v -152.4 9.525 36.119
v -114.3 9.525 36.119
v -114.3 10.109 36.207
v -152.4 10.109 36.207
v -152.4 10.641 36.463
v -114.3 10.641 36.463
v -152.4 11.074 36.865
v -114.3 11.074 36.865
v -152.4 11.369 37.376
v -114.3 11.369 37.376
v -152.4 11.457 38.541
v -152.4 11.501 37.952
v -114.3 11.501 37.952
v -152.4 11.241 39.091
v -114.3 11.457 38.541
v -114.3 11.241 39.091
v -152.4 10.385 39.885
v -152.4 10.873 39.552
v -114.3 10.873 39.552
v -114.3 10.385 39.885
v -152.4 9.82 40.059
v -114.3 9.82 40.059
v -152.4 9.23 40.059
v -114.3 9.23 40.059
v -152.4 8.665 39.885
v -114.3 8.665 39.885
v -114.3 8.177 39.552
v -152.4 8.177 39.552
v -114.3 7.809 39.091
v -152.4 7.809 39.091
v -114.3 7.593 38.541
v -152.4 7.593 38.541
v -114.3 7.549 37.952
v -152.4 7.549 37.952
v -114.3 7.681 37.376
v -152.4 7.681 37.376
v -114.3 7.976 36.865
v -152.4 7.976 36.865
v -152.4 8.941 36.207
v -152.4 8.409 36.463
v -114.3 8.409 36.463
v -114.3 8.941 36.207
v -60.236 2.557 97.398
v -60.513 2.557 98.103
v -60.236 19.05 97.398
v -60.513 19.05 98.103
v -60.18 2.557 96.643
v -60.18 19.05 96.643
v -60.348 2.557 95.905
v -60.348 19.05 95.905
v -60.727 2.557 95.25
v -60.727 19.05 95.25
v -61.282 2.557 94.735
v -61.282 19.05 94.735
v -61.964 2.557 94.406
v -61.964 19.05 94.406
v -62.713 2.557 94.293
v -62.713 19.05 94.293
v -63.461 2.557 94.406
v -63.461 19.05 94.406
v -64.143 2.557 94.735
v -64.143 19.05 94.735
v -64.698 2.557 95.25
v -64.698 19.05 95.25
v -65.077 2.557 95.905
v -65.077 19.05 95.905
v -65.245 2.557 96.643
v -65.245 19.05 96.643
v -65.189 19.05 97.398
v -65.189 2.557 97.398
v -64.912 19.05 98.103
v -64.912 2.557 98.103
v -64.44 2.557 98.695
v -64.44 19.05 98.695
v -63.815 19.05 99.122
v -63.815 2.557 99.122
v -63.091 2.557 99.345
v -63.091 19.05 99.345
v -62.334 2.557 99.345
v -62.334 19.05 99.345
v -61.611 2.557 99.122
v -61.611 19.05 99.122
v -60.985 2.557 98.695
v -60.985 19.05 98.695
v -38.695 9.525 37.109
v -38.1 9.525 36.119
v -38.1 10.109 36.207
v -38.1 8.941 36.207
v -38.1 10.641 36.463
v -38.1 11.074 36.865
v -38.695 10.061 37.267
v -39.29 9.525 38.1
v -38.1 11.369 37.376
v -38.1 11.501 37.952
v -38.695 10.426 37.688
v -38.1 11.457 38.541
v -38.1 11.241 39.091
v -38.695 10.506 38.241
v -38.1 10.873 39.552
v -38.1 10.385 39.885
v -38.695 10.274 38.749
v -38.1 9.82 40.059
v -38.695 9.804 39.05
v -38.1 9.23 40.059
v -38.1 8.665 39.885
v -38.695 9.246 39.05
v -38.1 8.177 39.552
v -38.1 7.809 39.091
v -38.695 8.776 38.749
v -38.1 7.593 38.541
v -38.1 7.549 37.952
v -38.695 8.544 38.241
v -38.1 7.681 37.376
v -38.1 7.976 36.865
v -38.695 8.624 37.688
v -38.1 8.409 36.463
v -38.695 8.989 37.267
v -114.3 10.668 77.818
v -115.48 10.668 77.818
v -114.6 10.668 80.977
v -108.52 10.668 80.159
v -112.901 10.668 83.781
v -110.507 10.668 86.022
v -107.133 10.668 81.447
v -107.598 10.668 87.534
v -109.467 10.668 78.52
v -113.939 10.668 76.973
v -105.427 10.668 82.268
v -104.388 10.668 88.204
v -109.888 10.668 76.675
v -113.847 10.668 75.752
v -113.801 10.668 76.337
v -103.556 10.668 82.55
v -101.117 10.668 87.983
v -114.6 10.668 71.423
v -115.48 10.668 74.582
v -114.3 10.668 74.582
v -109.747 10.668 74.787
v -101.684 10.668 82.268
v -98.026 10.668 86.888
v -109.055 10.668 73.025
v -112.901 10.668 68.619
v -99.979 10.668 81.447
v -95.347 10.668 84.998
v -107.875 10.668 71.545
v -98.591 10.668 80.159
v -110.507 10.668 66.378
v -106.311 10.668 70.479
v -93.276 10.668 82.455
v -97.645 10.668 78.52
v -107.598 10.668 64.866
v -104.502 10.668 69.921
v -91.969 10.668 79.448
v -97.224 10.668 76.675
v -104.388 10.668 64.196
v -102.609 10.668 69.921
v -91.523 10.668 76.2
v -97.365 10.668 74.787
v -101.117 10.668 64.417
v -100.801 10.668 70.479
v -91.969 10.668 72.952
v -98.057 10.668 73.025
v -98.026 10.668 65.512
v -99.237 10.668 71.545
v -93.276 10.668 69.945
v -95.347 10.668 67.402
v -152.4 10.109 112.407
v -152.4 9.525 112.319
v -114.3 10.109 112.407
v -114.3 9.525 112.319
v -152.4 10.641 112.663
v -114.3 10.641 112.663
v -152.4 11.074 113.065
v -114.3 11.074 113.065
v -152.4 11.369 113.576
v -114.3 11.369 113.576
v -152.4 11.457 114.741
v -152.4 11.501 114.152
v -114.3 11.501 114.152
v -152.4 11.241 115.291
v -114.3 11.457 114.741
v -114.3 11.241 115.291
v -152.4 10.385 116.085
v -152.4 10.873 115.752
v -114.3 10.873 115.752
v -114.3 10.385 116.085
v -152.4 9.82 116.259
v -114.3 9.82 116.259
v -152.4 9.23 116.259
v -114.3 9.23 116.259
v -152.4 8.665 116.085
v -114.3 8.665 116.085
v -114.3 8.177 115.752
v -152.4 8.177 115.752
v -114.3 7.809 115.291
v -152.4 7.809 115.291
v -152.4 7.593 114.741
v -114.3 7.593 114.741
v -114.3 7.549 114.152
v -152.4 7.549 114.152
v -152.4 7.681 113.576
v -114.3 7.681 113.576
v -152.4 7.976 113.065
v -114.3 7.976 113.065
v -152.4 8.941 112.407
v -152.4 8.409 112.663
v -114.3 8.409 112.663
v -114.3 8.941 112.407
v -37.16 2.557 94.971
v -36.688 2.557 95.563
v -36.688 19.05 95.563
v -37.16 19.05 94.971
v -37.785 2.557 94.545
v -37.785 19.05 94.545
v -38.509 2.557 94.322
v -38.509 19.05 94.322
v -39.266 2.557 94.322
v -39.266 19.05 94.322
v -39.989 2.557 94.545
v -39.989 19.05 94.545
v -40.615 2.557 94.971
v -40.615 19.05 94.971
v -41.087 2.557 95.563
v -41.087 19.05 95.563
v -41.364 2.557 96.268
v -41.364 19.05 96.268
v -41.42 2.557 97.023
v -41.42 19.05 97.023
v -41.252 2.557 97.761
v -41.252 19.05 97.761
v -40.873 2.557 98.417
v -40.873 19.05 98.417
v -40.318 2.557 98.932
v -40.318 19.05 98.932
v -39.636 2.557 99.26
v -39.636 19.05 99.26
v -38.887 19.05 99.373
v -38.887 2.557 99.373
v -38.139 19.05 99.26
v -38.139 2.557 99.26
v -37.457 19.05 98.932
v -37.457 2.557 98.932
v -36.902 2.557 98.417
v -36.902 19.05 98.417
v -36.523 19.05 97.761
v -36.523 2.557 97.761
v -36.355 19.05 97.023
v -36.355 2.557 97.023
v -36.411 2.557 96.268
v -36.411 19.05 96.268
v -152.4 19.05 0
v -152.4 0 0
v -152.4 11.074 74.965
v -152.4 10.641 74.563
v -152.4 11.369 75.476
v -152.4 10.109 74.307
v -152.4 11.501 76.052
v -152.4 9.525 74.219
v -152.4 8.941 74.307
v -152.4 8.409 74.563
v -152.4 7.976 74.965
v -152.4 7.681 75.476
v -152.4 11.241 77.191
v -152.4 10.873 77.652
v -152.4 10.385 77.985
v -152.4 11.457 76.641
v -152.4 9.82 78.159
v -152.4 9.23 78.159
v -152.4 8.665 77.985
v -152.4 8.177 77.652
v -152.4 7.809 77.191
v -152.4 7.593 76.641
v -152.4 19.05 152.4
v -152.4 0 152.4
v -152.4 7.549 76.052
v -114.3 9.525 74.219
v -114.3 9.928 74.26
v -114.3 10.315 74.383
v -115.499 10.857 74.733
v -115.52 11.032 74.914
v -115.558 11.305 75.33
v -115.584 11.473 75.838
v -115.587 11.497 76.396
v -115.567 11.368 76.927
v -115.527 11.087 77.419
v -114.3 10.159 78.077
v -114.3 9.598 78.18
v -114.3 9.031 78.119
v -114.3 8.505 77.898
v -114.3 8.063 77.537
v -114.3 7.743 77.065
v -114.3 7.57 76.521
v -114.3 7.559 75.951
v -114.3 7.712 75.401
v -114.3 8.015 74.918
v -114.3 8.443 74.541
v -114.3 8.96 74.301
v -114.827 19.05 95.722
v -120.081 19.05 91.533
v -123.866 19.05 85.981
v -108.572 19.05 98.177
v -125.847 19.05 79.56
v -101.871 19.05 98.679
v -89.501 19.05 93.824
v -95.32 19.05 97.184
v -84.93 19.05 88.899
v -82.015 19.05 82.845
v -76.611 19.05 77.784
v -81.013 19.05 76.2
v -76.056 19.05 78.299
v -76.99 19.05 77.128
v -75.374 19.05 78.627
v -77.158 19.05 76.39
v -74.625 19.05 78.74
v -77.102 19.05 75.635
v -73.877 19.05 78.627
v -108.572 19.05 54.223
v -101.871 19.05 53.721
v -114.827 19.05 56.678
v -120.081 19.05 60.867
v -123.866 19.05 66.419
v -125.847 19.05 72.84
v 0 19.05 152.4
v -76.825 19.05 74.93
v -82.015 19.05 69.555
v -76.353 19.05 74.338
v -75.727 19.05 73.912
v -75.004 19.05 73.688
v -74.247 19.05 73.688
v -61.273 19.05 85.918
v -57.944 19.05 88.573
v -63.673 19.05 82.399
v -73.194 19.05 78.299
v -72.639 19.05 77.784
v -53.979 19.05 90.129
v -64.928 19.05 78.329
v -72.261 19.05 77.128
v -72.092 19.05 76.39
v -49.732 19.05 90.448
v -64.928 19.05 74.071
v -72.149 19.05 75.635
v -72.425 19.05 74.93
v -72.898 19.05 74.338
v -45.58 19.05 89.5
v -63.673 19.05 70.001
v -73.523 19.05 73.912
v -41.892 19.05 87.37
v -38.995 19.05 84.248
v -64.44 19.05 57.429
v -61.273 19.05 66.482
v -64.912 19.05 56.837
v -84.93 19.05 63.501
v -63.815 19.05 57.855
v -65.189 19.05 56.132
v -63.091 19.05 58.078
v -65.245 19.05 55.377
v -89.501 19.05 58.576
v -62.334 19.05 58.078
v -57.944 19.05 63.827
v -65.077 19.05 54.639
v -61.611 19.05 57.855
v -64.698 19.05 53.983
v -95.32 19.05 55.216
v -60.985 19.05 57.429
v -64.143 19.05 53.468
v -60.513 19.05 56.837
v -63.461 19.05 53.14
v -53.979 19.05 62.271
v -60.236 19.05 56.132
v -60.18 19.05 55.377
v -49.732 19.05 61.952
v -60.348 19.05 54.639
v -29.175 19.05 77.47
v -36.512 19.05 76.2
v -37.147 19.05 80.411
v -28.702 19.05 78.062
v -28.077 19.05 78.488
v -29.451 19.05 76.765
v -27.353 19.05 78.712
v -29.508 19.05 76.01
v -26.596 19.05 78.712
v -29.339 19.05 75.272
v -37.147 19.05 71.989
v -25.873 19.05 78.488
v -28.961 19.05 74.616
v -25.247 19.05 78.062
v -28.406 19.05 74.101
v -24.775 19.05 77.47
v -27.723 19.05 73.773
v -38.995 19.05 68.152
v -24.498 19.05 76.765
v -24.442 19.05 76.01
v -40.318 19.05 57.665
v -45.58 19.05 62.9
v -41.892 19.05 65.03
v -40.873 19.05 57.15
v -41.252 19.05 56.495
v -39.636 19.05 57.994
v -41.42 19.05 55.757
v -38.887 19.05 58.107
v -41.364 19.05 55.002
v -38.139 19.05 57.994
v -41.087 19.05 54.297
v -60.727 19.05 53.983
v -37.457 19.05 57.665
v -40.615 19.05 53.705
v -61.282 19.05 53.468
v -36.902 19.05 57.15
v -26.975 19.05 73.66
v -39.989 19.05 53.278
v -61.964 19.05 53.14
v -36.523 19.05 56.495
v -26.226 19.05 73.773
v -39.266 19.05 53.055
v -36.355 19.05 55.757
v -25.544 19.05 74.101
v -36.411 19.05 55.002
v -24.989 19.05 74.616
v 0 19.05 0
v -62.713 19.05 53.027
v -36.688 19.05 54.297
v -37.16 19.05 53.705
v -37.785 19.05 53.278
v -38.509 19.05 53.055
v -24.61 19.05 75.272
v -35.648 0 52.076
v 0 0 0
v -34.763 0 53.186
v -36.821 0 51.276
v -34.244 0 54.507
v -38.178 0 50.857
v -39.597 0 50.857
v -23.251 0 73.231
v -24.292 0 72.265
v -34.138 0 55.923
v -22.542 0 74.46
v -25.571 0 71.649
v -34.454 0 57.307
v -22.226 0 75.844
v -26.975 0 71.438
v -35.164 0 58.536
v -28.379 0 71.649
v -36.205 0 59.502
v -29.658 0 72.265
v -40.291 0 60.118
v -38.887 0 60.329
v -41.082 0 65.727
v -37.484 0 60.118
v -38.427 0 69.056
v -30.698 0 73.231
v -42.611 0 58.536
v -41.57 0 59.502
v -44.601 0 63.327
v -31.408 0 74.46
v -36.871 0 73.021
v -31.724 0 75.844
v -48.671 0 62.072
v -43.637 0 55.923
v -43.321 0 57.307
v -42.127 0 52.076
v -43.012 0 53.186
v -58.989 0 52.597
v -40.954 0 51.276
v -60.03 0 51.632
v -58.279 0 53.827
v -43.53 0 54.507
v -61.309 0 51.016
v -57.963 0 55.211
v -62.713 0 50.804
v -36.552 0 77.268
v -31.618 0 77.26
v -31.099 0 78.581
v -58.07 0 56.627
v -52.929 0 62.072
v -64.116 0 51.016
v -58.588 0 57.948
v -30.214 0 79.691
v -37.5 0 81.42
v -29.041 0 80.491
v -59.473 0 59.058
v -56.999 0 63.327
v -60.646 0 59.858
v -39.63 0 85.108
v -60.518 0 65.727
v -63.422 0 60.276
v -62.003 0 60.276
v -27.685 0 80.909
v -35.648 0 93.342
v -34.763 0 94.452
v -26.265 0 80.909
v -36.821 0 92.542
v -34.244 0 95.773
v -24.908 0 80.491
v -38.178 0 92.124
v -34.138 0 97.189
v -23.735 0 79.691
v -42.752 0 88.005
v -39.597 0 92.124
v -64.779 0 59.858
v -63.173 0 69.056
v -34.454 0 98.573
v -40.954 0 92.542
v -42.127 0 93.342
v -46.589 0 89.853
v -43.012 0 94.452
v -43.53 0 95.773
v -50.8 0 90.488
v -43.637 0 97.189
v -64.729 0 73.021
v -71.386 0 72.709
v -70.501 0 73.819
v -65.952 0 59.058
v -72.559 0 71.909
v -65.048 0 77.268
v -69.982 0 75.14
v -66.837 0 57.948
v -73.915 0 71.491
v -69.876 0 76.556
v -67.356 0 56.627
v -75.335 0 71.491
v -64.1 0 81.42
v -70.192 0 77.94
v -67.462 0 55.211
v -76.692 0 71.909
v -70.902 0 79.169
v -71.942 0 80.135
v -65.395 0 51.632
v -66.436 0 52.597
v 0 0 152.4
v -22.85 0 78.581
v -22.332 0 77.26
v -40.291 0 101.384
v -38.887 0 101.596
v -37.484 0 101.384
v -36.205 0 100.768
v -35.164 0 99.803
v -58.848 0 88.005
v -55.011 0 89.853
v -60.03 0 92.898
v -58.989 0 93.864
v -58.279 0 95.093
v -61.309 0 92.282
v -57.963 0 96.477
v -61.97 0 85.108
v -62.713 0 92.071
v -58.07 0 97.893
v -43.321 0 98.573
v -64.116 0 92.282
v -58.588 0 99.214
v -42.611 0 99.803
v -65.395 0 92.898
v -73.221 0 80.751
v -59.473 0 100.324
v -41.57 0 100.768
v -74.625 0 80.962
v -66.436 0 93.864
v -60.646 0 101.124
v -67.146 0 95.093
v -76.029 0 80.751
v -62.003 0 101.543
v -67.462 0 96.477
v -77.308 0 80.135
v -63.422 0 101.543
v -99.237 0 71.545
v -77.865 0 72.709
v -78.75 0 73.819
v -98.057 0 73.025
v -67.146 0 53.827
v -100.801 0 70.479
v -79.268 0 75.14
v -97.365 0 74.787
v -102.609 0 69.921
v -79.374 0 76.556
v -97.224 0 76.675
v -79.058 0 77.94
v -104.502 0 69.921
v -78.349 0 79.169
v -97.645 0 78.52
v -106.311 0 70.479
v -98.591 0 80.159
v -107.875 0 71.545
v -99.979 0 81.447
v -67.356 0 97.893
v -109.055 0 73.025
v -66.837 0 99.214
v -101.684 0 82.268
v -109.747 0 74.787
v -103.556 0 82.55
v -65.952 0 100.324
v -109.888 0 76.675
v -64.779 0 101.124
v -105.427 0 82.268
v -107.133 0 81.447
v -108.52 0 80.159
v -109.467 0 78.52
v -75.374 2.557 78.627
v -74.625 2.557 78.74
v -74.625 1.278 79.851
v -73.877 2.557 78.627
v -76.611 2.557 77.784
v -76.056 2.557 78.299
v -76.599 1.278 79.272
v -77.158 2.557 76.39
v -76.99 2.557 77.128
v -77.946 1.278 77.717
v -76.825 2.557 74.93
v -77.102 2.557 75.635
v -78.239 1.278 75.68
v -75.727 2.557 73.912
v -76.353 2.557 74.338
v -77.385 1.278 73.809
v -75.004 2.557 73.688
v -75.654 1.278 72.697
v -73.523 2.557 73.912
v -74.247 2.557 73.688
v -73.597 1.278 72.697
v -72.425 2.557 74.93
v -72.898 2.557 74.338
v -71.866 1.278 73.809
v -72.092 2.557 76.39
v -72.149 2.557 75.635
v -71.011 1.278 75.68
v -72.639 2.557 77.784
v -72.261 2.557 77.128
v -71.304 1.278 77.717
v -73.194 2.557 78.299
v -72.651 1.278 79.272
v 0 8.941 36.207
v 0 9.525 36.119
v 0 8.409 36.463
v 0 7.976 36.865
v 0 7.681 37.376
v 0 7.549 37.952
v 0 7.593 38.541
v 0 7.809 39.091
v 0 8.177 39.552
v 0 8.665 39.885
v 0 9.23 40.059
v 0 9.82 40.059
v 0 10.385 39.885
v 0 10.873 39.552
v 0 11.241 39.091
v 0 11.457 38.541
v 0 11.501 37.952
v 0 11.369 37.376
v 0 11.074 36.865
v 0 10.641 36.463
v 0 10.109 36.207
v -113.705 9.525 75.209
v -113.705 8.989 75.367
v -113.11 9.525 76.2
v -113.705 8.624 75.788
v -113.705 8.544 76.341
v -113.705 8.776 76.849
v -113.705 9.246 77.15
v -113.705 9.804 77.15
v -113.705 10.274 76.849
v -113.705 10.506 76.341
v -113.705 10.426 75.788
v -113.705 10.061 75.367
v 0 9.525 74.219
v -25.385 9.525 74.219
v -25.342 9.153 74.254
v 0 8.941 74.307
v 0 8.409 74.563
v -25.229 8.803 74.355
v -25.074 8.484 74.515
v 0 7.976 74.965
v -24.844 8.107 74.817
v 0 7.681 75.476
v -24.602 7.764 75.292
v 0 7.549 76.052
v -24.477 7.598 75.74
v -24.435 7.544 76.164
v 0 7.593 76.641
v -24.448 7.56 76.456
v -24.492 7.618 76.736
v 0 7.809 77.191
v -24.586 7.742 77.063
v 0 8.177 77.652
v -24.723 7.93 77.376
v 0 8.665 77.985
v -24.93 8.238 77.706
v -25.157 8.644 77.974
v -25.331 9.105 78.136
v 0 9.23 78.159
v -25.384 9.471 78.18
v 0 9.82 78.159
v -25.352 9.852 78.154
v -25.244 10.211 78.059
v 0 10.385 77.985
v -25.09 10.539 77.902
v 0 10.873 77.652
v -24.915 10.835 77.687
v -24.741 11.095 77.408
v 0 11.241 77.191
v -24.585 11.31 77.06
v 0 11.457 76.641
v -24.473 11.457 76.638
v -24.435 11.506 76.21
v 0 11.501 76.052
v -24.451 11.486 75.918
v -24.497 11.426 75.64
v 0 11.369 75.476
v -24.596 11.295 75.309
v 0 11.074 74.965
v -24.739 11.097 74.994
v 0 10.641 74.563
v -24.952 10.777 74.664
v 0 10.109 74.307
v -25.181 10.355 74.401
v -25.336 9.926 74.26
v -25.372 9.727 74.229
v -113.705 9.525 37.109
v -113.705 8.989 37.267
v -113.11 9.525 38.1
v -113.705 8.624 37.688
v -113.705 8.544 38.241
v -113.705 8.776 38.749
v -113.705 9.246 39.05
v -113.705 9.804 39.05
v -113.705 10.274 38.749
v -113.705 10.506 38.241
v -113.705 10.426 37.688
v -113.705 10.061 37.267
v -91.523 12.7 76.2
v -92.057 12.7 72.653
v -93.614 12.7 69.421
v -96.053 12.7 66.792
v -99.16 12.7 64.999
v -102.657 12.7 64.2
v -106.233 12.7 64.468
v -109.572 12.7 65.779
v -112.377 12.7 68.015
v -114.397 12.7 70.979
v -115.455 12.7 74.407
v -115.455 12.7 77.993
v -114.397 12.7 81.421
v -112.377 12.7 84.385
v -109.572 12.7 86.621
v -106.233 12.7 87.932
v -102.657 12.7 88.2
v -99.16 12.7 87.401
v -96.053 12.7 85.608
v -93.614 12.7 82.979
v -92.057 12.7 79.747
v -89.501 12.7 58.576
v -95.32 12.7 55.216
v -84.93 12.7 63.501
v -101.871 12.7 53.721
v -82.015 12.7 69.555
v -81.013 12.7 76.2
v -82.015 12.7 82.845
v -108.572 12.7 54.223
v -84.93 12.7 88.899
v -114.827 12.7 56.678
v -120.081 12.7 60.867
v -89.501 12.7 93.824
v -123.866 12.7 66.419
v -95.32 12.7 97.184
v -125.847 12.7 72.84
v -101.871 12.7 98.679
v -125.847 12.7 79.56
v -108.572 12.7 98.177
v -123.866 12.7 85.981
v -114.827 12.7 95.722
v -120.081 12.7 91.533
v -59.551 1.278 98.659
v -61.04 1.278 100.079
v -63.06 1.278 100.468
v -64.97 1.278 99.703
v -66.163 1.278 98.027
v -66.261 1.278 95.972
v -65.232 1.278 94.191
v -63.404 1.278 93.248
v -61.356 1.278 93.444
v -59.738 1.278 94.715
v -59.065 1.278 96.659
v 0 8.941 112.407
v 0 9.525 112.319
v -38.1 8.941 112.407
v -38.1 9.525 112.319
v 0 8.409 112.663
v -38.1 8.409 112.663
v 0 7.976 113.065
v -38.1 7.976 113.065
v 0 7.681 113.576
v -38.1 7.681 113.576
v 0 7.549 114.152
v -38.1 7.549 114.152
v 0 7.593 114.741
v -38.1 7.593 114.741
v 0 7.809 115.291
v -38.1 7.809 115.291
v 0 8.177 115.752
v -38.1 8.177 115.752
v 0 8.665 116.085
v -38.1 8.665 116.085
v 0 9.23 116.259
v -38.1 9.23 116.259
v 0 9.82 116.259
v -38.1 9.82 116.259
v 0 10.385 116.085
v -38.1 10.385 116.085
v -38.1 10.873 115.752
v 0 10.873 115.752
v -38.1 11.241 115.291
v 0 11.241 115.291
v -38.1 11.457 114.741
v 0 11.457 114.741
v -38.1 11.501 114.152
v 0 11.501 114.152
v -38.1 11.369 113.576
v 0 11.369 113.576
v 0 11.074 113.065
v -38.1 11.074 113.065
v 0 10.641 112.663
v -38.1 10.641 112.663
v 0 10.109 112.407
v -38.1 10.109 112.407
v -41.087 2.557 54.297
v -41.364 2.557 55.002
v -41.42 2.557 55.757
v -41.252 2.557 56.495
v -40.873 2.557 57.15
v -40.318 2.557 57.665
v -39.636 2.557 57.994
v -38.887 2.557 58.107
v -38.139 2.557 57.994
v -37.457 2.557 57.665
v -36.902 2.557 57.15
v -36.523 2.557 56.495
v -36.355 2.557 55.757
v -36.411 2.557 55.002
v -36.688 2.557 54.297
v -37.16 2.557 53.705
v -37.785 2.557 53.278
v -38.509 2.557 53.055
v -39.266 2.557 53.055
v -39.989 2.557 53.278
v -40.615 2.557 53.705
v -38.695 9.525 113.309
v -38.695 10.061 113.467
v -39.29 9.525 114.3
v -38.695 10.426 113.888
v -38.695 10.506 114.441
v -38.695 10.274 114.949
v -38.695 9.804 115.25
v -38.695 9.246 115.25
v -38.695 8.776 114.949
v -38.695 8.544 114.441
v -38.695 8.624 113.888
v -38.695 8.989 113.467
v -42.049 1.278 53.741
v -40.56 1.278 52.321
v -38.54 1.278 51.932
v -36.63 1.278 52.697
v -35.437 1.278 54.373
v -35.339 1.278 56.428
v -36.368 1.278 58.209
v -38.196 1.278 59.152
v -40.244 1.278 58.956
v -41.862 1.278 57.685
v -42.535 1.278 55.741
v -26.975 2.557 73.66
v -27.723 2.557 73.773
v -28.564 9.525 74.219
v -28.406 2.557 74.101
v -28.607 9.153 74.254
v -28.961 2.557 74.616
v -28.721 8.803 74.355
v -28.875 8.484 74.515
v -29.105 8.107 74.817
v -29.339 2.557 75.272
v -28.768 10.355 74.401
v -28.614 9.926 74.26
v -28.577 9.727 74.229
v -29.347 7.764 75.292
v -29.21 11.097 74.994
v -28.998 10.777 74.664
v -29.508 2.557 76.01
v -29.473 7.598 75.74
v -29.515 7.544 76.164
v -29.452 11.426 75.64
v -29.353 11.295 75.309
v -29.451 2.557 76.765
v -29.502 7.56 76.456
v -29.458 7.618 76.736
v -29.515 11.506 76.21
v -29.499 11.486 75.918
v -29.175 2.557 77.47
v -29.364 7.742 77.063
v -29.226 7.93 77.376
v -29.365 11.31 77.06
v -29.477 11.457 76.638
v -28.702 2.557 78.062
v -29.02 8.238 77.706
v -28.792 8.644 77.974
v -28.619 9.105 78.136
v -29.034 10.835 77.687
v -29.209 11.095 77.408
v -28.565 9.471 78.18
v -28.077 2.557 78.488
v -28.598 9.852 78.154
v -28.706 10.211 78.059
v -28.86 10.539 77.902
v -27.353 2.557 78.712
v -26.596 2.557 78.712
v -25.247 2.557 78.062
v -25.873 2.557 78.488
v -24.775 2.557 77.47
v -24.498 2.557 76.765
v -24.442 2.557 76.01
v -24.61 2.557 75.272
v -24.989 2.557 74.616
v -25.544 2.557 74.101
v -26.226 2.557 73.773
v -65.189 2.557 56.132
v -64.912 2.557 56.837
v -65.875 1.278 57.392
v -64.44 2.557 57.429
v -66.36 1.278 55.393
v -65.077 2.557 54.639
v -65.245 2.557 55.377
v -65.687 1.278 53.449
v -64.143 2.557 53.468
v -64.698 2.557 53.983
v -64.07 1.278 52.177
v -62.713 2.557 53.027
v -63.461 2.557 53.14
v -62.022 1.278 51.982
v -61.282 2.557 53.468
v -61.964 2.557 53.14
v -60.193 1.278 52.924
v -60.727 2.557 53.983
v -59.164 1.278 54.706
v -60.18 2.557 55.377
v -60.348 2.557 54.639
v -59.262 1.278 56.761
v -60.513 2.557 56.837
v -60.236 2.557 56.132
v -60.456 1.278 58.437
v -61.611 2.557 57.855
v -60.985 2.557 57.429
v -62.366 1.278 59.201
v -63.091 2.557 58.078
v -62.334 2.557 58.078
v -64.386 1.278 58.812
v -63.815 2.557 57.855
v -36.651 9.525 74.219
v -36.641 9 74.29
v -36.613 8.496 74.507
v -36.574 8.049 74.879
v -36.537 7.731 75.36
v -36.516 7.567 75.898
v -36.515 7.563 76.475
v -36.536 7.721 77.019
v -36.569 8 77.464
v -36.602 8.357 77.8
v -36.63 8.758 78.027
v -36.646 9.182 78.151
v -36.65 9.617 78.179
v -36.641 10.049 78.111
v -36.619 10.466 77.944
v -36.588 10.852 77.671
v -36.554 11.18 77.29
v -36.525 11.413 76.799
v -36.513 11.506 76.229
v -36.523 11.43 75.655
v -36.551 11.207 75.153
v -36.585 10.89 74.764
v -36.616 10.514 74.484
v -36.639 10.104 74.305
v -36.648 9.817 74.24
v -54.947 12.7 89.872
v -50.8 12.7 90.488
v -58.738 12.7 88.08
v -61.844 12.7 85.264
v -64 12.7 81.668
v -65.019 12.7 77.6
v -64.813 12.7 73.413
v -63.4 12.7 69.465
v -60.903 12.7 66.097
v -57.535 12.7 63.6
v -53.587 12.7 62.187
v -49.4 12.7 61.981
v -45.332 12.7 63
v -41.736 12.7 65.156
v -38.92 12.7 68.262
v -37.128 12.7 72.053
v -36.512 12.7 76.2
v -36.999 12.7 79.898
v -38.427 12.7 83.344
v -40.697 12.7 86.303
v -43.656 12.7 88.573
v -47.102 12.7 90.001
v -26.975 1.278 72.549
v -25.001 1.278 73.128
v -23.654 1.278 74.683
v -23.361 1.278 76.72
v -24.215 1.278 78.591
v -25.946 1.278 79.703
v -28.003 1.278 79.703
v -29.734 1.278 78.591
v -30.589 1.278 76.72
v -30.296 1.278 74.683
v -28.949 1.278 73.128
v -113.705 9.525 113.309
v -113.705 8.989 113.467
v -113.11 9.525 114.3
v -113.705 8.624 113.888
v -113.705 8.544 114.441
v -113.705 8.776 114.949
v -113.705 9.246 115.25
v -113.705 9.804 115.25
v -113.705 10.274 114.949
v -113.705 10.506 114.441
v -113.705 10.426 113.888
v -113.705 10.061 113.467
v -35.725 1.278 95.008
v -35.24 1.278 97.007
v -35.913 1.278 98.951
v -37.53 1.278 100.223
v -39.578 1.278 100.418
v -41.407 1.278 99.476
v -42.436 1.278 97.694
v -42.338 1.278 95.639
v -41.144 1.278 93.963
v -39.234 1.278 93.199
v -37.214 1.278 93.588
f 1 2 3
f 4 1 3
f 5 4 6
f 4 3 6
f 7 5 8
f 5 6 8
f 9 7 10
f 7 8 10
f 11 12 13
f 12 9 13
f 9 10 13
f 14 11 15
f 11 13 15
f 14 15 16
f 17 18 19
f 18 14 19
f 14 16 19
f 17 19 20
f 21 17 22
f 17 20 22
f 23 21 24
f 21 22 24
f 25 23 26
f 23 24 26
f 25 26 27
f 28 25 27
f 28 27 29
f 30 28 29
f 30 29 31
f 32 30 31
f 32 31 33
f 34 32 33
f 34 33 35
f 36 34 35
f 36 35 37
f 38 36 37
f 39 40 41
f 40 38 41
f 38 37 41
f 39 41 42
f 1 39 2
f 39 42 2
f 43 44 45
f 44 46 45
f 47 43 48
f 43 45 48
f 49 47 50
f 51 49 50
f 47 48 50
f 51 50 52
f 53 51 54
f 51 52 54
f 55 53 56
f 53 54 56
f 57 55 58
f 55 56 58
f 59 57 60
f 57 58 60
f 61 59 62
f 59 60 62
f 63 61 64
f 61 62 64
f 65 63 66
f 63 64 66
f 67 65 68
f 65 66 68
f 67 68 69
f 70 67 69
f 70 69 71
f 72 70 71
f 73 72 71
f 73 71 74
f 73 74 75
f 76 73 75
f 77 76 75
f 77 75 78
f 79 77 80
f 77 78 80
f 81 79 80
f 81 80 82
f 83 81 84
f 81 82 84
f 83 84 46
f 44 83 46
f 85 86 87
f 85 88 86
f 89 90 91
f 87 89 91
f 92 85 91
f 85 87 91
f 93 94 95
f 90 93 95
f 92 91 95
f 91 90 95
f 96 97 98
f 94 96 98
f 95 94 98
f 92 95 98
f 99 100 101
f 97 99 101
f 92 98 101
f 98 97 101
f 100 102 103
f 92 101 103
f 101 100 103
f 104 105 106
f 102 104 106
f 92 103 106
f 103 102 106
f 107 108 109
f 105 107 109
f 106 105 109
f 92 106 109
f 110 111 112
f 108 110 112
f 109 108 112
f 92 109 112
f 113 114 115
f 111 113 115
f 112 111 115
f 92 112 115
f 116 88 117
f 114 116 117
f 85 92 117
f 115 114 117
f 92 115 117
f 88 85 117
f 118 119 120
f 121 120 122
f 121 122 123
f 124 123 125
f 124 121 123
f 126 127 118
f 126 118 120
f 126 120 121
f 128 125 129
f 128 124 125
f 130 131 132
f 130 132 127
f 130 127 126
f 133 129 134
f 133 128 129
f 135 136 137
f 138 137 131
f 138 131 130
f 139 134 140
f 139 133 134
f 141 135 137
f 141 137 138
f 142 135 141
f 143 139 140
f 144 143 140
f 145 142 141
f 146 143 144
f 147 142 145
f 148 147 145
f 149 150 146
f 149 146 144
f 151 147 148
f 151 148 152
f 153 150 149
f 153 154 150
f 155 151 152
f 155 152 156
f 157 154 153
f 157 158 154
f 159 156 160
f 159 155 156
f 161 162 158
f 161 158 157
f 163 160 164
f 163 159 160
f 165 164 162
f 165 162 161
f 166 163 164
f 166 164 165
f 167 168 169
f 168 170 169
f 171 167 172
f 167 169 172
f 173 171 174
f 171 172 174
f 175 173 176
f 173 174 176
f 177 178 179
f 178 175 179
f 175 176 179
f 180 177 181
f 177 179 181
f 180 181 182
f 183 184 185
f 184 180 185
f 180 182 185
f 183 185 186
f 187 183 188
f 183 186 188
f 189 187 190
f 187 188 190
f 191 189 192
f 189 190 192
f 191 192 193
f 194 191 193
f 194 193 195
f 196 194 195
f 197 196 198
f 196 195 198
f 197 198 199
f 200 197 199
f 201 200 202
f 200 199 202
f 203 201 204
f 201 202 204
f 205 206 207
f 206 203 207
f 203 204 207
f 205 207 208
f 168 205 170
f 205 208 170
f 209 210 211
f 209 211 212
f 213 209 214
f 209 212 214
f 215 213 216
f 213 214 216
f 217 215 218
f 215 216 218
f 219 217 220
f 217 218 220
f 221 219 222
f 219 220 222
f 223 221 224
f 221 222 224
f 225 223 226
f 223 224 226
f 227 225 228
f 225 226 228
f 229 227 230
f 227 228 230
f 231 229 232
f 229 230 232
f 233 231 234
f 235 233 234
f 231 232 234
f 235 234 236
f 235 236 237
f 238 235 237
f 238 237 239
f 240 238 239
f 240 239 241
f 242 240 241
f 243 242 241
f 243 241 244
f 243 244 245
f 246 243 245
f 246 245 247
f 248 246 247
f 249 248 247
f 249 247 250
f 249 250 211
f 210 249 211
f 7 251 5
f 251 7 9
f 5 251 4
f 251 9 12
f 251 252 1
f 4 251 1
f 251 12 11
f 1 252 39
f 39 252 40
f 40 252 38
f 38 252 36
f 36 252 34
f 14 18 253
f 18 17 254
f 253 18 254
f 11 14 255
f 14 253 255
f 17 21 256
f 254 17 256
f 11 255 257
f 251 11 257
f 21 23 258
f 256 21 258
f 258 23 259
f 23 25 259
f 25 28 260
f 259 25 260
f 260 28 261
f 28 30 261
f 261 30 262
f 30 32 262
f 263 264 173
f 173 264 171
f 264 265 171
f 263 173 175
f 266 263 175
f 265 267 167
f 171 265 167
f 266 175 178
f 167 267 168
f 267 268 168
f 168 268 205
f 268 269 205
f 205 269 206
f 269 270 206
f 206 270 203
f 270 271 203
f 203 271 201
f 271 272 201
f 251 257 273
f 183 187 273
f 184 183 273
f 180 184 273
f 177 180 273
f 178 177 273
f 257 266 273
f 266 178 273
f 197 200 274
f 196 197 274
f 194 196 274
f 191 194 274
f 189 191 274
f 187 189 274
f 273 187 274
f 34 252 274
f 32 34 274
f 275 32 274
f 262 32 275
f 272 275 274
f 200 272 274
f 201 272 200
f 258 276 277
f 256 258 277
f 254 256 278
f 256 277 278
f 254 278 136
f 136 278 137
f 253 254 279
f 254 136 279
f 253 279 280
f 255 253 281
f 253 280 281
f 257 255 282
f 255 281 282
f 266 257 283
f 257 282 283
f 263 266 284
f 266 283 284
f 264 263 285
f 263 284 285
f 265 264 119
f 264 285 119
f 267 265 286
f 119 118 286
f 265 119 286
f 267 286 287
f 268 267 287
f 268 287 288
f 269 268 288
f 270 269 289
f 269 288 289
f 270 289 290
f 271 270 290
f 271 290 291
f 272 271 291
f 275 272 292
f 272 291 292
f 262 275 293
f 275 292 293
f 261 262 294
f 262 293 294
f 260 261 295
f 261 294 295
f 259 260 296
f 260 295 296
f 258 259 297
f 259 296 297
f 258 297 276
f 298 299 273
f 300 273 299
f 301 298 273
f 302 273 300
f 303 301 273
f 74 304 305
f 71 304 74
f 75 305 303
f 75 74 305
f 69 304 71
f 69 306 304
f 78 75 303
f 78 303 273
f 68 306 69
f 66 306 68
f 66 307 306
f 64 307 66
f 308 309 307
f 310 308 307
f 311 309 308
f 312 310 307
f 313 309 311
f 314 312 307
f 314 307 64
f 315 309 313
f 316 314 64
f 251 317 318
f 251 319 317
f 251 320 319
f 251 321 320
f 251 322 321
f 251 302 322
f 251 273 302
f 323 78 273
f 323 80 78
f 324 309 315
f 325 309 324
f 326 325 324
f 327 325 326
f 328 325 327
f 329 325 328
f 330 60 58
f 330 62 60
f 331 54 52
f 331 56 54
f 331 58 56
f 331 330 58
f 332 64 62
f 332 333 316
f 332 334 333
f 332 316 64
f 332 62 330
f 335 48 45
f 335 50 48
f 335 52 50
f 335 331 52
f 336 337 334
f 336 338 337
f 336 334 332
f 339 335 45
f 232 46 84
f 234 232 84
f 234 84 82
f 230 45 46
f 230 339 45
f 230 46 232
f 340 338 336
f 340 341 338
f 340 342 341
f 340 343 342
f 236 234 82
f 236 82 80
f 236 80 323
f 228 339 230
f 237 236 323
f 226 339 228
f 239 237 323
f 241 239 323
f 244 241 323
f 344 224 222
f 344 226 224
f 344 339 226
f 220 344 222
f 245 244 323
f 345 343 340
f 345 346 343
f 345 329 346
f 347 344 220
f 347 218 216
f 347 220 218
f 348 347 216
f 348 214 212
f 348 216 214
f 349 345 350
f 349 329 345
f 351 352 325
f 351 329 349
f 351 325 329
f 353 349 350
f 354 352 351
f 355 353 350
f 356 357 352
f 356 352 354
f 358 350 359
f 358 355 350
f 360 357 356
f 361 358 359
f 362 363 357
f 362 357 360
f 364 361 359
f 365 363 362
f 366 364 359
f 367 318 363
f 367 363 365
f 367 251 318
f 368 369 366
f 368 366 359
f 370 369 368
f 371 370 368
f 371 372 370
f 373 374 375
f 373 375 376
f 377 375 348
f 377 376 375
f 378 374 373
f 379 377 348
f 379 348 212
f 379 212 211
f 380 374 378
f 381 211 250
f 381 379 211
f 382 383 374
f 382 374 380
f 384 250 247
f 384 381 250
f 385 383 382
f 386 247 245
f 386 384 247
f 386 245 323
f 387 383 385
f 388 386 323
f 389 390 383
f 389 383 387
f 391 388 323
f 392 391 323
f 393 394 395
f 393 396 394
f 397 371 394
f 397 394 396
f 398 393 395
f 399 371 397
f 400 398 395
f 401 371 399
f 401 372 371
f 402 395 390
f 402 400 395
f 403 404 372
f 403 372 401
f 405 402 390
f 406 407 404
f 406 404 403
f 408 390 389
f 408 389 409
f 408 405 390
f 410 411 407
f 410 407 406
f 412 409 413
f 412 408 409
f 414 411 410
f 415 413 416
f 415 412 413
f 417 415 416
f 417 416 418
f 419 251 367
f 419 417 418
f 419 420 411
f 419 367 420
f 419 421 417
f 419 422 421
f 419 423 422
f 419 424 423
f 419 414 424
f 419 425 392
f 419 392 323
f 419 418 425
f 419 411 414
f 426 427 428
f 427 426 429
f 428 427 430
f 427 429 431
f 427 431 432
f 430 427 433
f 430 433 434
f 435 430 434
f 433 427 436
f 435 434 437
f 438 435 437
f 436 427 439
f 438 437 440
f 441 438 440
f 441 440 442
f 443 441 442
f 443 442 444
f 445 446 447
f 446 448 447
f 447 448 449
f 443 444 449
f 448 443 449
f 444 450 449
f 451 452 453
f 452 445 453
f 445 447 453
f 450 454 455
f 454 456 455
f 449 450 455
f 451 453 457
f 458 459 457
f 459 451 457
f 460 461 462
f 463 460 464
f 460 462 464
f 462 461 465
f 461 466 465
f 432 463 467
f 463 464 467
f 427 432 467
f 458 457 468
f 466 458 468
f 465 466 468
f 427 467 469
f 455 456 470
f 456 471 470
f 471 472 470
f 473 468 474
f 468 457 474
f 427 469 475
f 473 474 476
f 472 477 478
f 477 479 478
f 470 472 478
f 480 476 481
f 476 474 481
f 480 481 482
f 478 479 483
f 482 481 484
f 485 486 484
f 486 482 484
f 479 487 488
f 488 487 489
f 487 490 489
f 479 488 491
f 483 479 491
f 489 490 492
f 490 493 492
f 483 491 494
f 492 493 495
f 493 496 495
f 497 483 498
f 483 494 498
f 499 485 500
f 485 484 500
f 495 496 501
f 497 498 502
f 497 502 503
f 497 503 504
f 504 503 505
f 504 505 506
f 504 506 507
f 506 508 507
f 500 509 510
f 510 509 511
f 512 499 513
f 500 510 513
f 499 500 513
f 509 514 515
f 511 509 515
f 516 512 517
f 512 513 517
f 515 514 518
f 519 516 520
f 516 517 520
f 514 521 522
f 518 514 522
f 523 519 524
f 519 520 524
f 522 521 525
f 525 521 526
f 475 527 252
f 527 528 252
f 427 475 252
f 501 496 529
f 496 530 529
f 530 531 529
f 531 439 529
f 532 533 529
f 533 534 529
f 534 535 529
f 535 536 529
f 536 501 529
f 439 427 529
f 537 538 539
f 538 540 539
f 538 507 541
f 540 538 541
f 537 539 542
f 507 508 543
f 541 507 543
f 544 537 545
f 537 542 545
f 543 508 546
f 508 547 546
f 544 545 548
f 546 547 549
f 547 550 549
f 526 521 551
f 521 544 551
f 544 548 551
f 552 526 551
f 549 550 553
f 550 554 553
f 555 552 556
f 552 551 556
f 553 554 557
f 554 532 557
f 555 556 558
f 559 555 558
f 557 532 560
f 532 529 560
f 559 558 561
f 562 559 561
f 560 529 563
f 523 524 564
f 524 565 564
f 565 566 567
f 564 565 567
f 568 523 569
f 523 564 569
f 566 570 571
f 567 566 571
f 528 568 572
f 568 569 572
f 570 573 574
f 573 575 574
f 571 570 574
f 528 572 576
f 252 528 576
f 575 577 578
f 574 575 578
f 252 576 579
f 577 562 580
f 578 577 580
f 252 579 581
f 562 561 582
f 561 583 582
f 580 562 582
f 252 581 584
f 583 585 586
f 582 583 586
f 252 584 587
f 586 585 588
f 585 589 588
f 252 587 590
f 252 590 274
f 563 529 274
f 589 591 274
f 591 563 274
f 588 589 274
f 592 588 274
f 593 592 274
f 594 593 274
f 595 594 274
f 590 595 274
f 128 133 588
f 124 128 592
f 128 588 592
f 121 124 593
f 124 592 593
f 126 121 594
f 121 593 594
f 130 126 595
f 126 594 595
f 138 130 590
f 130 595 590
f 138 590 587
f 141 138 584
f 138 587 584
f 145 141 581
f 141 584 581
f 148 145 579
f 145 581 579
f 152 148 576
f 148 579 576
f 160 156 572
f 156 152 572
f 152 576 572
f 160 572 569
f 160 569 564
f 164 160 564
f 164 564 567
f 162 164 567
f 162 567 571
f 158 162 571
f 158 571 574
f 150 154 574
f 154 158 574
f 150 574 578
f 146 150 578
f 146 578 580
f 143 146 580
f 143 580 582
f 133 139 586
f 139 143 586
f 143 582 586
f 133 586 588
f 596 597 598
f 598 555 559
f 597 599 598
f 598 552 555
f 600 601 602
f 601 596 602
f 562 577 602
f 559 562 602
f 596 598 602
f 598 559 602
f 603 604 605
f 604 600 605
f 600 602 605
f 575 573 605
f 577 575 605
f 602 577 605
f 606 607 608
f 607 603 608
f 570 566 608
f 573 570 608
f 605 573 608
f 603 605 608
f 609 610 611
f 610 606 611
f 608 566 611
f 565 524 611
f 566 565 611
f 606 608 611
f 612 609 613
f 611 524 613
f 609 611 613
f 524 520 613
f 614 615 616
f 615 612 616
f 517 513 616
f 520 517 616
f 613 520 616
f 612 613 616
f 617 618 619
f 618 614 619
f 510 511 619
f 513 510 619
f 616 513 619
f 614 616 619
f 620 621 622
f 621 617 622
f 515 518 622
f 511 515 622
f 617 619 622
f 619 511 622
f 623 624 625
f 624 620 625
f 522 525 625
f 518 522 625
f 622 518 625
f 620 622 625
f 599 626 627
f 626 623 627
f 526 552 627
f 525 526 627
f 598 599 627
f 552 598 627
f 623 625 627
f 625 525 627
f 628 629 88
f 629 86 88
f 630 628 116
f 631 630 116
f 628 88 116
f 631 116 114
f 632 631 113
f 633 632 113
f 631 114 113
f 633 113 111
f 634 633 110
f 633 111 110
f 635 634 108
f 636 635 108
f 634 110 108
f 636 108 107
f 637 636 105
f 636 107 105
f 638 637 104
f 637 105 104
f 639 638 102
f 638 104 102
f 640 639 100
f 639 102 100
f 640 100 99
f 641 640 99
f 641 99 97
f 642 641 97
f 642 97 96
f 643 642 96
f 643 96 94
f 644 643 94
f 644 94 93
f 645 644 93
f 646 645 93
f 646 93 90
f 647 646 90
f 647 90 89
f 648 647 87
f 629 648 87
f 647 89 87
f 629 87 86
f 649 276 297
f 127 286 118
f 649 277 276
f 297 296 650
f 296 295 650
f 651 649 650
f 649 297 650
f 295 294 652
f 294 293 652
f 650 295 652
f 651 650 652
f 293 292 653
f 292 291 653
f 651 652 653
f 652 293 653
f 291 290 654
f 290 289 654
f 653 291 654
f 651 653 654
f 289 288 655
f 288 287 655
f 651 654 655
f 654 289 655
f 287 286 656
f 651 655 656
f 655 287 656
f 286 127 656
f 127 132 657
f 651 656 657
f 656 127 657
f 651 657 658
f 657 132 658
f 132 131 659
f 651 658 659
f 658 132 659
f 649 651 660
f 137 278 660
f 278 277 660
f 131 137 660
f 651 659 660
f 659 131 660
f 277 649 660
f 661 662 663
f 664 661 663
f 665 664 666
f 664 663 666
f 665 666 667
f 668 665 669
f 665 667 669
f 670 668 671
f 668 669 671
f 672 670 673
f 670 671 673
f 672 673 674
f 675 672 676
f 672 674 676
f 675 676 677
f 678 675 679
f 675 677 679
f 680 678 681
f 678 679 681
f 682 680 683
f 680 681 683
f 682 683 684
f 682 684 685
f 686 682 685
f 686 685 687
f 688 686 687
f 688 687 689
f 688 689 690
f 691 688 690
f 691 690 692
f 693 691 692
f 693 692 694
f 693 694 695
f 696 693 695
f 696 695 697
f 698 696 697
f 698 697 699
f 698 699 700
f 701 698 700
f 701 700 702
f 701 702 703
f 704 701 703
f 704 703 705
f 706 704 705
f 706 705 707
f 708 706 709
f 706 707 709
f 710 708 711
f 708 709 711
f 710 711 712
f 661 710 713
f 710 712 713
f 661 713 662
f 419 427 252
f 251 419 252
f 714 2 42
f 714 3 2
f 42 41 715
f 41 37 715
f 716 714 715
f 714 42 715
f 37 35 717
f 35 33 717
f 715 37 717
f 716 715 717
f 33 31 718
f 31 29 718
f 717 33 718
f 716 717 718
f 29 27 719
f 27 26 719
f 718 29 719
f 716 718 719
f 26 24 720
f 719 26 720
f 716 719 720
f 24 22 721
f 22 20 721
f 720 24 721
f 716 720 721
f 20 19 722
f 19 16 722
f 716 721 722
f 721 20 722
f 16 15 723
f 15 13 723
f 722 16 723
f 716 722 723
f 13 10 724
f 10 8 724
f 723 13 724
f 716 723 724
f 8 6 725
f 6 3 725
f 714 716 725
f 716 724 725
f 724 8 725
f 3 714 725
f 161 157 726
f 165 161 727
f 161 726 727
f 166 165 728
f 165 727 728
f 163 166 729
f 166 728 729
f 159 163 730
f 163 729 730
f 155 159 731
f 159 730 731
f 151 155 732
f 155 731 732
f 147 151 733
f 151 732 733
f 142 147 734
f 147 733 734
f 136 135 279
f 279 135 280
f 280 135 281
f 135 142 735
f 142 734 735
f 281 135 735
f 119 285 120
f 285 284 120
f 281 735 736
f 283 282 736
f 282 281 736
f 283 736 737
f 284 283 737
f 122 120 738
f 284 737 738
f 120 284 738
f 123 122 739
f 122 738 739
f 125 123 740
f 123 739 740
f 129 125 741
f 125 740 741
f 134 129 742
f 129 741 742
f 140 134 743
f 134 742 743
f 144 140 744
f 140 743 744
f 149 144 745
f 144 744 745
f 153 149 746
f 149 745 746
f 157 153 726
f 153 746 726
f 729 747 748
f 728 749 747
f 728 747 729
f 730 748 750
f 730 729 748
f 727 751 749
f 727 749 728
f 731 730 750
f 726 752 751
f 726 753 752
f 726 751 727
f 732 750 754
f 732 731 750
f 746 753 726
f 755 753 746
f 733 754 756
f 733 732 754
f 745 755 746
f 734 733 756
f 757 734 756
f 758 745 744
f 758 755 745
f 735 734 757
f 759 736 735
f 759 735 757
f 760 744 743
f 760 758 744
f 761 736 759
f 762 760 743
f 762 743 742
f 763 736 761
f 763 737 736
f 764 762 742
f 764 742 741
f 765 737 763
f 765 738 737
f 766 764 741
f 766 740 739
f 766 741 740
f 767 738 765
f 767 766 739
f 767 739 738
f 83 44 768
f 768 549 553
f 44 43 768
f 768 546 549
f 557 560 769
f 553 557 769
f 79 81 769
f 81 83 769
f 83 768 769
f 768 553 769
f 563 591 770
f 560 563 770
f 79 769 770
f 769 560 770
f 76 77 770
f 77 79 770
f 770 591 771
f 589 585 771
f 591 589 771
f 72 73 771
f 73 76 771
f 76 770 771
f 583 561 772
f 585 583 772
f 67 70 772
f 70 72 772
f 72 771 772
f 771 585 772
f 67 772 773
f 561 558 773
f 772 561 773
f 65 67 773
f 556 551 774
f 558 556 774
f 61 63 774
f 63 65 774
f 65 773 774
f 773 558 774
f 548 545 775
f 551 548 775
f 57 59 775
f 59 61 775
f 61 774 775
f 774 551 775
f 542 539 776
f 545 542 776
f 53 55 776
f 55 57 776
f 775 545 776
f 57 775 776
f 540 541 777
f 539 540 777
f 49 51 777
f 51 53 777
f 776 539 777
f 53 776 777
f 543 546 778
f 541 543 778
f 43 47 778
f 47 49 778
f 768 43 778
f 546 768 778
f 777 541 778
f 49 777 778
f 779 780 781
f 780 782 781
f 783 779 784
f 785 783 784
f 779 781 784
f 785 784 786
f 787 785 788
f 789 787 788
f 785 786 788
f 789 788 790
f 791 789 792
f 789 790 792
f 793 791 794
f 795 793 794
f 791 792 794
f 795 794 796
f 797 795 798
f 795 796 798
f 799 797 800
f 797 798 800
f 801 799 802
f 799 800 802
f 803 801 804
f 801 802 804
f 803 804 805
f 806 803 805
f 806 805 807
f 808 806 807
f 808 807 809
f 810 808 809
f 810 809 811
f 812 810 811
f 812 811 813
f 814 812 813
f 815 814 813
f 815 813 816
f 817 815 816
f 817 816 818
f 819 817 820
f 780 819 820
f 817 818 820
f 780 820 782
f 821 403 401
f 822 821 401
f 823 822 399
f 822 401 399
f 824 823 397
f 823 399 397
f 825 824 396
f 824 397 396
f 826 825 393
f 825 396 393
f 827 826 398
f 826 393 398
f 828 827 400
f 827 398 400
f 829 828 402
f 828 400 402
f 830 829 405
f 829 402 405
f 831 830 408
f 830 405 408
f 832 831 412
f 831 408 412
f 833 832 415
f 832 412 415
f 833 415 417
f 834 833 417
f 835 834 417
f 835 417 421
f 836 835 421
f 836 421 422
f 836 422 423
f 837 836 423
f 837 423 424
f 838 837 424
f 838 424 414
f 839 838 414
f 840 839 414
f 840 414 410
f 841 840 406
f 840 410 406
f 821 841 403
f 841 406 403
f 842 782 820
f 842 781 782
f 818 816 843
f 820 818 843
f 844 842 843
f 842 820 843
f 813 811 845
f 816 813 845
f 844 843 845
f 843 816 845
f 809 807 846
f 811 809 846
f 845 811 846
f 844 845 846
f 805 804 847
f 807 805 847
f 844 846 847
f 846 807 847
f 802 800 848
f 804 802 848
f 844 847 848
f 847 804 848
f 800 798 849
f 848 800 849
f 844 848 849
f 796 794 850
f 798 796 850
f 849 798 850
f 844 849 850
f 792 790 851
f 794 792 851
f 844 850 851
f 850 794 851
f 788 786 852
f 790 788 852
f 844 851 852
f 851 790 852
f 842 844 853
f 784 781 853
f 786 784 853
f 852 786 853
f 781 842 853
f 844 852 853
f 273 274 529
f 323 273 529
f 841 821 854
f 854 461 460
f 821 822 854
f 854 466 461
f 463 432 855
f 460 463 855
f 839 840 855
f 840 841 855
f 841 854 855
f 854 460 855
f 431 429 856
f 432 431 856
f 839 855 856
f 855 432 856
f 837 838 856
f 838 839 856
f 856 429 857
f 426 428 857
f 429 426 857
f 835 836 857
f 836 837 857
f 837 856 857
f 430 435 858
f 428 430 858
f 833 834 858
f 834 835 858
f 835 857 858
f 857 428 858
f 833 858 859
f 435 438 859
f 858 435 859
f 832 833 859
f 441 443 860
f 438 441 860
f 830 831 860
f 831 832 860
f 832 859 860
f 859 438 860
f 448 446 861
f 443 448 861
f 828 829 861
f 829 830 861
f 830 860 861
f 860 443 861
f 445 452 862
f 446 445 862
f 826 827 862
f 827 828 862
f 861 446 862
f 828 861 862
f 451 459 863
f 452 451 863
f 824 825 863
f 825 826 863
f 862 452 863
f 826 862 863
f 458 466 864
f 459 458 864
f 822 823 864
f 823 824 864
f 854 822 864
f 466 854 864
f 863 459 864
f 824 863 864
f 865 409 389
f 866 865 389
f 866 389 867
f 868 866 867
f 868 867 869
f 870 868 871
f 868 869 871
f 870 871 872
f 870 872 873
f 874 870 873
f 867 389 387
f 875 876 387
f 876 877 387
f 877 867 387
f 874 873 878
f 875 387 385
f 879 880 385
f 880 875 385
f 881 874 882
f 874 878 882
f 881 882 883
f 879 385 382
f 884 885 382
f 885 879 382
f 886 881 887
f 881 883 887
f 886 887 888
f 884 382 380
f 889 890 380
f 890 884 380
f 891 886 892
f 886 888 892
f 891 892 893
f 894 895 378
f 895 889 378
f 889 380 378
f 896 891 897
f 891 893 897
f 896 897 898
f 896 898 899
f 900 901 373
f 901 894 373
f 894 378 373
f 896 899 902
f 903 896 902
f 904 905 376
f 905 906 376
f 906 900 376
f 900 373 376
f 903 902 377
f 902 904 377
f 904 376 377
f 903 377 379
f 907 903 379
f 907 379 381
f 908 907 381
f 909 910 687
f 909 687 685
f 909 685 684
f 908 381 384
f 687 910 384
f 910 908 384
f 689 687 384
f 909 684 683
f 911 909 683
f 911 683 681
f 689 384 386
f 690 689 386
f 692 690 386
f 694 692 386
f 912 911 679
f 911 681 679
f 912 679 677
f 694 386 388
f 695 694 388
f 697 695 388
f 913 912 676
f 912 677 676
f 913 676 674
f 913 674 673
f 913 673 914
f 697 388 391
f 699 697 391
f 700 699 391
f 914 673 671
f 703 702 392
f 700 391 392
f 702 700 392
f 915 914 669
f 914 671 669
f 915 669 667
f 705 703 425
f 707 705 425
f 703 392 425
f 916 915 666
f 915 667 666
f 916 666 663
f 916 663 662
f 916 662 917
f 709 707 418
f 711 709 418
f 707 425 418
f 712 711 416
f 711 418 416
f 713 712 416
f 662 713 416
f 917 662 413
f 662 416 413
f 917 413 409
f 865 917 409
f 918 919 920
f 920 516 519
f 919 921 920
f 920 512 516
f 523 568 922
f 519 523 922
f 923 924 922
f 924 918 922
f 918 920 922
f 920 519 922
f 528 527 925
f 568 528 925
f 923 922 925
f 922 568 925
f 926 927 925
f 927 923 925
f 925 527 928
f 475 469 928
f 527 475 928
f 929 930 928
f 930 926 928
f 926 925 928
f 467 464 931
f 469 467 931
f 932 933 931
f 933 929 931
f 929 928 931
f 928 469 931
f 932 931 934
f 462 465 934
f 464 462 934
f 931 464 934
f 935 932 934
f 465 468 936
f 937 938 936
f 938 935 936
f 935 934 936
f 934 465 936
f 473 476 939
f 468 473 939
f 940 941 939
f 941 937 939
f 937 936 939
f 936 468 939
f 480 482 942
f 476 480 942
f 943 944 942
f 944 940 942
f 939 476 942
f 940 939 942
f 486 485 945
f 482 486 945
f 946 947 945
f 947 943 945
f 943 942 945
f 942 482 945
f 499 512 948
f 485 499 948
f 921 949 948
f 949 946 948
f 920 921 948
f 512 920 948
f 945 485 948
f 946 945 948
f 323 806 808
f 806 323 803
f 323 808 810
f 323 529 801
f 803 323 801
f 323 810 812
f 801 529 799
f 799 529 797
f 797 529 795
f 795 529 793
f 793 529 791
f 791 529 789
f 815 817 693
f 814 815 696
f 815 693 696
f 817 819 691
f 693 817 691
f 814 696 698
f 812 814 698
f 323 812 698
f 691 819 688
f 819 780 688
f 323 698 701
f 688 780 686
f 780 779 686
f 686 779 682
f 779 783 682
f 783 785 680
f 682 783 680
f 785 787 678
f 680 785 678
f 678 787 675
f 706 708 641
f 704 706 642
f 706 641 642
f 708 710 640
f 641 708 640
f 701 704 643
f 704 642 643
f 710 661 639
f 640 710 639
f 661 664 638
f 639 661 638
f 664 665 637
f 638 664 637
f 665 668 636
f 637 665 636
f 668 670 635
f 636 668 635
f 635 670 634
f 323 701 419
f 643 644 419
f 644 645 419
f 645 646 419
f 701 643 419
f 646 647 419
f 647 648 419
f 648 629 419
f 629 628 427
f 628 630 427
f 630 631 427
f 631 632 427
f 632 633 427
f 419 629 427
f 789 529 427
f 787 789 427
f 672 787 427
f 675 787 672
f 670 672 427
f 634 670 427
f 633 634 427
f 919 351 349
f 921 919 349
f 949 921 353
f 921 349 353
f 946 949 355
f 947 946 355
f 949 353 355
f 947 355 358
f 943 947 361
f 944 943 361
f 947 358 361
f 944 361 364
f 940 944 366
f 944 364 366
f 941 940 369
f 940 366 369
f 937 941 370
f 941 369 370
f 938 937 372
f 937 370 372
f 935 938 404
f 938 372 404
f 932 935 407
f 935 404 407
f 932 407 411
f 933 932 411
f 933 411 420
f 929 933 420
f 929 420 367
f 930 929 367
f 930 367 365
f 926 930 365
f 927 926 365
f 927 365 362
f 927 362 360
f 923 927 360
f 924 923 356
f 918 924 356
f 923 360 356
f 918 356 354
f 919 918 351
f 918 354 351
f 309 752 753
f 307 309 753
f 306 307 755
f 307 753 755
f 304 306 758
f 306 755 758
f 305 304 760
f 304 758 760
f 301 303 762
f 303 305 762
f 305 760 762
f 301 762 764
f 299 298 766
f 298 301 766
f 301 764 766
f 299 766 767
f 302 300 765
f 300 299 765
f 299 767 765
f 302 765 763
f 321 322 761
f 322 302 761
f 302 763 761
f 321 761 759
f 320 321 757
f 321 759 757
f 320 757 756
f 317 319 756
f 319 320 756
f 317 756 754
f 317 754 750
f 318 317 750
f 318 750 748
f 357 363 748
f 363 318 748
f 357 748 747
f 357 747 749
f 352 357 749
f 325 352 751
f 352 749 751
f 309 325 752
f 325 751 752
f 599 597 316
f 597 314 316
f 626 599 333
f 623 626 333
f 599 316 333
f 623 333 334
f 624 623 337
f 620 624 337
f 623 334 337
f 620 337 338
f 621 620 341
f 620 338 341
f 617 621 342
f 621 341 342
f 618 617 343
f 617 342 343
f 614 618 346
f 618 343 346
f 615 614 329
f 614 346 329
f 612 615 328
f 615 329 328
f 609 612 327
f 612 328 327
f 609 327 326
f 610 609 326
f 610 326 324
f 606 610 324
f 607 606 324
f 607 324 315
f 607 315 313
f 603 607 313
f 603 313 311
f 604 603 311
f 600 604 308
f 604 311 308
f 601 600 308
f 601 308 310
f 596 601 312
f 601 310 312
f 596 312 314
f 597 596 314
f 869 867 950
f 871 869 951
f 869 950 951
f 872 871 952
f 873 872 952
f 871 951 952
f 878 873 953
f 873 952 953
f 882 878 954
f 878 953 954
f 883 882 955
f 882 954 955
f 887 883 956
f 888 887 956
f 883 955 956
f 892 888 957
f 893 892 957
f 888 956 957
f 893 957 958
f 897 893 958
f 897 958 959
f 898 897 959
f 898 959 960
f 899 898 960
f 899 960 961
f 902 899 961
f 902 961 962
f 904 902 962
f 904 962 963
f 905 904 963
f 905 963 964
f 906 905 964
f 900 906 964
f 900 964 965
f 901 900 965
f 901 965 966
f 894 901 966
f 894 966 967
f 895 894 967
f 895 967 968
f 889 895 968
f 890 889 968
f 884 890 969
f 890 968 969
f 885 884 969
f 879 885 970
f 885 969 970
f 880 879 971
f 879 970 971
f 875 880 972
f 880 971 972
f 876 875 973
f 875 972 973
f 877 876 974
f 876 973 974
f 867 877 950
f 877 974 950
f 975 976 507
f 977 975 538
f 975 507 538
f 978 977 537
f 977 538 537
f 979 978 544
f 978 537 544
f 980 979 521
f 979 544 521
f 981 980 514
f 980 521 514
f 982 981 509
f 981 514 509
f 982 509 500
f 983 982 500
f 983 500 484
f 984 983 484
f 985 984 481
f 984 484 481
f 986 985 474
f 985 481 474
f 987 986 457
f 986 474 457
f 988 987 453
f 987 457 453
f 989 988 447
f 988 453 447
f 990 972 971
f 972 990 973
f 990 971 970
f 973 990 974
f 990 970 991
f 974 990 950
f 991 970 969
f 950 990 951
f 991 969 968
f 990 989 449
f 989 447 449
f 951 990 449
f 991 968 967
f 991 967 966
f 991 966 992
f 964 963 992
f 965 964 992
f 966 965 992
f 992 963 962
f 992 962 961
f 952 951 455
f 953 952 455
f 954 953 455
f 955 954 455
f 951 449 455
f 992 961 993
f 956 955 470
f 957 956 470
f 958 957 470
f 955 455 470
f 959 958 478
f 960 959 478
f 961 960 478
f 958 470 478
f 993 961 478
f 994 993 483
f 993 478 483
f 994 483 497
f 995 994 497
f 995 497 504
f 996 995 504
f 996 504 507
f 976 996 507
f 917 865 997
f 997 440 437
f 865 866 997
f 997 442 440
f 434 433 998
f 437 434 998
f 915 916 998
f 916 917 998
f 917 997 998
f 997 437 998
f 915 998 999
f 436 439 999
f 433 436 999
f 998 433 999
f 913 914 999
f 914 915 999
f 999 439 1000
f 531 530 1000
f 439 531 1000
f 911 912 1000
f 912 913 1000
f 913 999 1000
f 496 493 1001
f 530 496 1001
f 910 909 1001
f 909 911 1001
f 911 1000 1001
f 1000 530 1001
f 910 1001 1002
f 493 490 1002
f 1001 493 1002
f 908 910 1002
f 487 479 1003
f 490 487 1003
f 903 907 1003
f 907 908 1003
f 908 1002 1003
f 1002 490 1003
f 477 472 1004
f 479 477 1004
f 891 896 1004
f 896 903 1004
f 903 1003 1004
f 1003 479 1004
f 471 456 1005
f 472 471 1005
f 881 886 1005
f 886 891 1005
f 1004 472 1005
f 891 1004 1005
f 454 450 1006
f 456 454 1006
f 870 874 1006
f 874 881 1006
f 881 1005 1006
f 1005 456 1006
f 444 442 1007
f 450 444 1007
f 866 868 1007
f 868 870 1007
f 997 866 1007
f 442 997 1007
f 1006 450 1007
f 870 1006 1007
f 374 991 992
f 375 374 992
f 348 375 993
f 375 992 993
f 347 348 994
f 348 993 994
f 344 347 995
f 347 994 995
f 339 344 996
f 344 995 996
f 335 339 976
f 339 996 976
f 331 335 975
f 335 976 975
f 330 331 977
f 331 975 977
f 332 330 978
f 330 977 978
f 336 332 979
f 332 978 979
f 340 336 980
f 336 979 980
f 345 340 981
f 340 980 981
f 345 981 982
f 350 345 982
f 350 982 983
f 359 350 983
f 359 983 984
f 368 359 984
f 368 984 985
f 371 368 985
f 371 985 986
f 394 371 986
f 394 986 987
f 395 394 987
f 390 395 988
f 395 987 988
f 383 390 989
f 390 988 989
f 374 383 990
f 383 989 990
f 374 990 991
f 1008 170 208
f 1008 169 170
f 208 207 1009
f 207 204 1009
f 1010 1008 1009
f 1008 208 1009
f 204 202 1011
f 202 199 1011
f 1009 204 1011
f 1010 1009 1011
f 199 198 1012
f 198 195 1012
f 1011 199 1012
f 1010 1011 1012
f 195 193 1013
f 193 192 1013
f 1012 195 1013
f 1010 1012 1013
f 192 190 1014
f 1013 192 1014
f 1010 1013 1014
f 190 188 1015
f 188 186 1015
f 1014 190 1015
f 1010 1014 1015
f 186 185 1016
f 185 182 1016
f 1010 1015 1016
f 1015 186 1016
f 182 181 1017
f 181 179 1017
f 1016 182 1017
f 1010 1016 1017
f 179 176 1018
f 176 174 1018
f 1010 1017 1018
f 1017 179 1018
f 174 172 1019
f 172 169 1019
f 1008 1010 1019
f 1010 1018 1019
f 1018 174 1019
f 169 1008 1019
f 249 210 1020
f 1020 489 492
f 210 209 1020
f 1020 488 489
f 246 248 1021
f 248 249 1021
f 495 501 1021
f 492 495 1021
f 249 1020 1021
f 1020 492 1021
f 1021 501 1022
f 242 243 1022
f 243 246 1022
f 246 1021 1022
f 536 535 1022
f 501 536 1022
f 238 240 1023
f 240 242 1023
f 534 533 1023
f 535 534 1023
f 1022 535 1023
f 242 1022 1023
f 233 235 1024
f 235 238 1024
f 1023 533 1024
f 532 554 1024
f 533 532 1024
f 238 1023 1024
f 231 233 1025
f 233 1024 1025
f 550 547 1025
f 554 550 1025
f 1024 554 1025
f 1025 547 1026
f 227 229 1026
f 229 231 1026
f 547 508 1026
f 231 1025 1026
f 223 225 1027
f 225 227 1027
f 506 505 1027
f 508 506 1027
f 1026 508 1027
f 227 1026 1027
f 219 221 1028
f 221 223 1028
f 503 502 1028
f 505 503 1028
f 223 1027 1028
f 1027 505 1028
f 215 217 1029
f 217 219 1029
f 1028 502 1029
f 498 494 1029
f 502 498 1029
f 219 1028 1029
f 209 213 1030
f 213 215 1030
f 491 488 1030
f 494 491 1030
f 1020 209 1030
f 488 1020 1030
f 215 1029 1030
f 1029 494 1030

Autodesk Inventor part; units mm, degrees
ref_plane "YZ Plane" through (0, 0, 0) normal (1, 0, 0) x (0, 1, 0)
ref_plane "XZ Plane" through (0, 0, 0) normal (0, 1, 0) x (-1, 0, 0)
sketch "Sketch1" plane through (0, 0, 0) normal (0, 1, 0) x (-1, 0, 0)
  line L0 (0, 0) -> (152.4, 0)
  line L1 (152.4, 0) -> (152.4, 152.4)
  line L2 (152.4, 152.4) -> (0, 152.4)
  line L3 (0, 152.4) -> (0, 0)
  dimension "d0" = 152.4
  dimension "d1" = 152.4
extrude "Extrusion1" add sketch "Sketch1" along normal blind 12.7
hole "Hole1" at (-103.5558, 12.7, 76.2) direction (0, -1, 0) diameter 12.7 end through all
hole "Hole2" at (-50.8, 12.7, 76.2) direction (0, -1, 0) diameter 28.575 end through all
hole "Hole3" at (38.1, 0, 58.6994) direction (0, 1, 0) diameter 4.5 end through all countersink diameter 9.525 countersink angle 82
pattern_circular "Circular Pattern1" count 4 over 360 about axis through (-103.5558, -203.2, 76.2) along (0, 1, 0) of "Hole3"
sketch "Sketch4" plane through (0, 12.7, 0) normal (0, 1, 0) x (1, 0, 0)
  circle A0 centre (-103.5558, -76.2) radius 6.35 projected
  circle A1 centre (-103.5558, -76.2) radius 12.0332
  dimension "d41" = 24.0665
sketch "Sketch5" plane through (0, 12.7, 0) normal (0, 1, 0) x (1, 0, 0)
  circle A0 centre (-50.8, -76.2) radius 14.2875 projected
  circle A1 centre (-103.5558, -76.2) radius 6.35 projected
  line L0 (0, 0) -> (-152.4, 0) projected
  line L1 (-152.4, 0) -> (-152.4, -152.4) projected
  line L2 (-152.4, -152.4) -> (0, -152.4) projected
  line L3 (0, -152.4) -> (0, 0) projected
  circle A2 centre (-103.5558, -76.2) radius 22.5425
  dimension "d42" = 45.085
extrude "Extrusion4" add sketch "Sketch5" along normal blind 6.35 contours L3 L2 L1 L0
extrude "Extrusion5" cut sketch "Sketch4" against normal blind 2.032
hole "Hole4" at (-26.9748, 0, 76.2) direction (0, 1, 0) diameter 5.08 end through all countersink diameter 9.525 countersink angle 82
pattern_circular "Circular Pattern2" count 6 over 360 about axis through (-50.8, 19.05, 76.2) along (0, -1, 0) of "Hole4"
hole "Hole5" at (0, 9.525, 114.3) direction (-1, 0, 0) diameter 3.9624 depth 38.1 tip angle 118 thread size "10-32 UNF" class "2B" standard "ANSI Unified Screw Threads"
pattern_linear "Rectangular Pattern1" count 3 spacing 38.1 along (0, 0, -1) of "Hole5"
ref_plane "Work Plane1" through (-76.2, 0, 0) normal (-1, 0, 0) x (0, 0, 1)
mirror "Mirror1" about plane through (-76.2, 0, 0) normal (-1, 0, 0) of "Hole5", "Rectangular Pattern1"
properties part number "Traveler"
